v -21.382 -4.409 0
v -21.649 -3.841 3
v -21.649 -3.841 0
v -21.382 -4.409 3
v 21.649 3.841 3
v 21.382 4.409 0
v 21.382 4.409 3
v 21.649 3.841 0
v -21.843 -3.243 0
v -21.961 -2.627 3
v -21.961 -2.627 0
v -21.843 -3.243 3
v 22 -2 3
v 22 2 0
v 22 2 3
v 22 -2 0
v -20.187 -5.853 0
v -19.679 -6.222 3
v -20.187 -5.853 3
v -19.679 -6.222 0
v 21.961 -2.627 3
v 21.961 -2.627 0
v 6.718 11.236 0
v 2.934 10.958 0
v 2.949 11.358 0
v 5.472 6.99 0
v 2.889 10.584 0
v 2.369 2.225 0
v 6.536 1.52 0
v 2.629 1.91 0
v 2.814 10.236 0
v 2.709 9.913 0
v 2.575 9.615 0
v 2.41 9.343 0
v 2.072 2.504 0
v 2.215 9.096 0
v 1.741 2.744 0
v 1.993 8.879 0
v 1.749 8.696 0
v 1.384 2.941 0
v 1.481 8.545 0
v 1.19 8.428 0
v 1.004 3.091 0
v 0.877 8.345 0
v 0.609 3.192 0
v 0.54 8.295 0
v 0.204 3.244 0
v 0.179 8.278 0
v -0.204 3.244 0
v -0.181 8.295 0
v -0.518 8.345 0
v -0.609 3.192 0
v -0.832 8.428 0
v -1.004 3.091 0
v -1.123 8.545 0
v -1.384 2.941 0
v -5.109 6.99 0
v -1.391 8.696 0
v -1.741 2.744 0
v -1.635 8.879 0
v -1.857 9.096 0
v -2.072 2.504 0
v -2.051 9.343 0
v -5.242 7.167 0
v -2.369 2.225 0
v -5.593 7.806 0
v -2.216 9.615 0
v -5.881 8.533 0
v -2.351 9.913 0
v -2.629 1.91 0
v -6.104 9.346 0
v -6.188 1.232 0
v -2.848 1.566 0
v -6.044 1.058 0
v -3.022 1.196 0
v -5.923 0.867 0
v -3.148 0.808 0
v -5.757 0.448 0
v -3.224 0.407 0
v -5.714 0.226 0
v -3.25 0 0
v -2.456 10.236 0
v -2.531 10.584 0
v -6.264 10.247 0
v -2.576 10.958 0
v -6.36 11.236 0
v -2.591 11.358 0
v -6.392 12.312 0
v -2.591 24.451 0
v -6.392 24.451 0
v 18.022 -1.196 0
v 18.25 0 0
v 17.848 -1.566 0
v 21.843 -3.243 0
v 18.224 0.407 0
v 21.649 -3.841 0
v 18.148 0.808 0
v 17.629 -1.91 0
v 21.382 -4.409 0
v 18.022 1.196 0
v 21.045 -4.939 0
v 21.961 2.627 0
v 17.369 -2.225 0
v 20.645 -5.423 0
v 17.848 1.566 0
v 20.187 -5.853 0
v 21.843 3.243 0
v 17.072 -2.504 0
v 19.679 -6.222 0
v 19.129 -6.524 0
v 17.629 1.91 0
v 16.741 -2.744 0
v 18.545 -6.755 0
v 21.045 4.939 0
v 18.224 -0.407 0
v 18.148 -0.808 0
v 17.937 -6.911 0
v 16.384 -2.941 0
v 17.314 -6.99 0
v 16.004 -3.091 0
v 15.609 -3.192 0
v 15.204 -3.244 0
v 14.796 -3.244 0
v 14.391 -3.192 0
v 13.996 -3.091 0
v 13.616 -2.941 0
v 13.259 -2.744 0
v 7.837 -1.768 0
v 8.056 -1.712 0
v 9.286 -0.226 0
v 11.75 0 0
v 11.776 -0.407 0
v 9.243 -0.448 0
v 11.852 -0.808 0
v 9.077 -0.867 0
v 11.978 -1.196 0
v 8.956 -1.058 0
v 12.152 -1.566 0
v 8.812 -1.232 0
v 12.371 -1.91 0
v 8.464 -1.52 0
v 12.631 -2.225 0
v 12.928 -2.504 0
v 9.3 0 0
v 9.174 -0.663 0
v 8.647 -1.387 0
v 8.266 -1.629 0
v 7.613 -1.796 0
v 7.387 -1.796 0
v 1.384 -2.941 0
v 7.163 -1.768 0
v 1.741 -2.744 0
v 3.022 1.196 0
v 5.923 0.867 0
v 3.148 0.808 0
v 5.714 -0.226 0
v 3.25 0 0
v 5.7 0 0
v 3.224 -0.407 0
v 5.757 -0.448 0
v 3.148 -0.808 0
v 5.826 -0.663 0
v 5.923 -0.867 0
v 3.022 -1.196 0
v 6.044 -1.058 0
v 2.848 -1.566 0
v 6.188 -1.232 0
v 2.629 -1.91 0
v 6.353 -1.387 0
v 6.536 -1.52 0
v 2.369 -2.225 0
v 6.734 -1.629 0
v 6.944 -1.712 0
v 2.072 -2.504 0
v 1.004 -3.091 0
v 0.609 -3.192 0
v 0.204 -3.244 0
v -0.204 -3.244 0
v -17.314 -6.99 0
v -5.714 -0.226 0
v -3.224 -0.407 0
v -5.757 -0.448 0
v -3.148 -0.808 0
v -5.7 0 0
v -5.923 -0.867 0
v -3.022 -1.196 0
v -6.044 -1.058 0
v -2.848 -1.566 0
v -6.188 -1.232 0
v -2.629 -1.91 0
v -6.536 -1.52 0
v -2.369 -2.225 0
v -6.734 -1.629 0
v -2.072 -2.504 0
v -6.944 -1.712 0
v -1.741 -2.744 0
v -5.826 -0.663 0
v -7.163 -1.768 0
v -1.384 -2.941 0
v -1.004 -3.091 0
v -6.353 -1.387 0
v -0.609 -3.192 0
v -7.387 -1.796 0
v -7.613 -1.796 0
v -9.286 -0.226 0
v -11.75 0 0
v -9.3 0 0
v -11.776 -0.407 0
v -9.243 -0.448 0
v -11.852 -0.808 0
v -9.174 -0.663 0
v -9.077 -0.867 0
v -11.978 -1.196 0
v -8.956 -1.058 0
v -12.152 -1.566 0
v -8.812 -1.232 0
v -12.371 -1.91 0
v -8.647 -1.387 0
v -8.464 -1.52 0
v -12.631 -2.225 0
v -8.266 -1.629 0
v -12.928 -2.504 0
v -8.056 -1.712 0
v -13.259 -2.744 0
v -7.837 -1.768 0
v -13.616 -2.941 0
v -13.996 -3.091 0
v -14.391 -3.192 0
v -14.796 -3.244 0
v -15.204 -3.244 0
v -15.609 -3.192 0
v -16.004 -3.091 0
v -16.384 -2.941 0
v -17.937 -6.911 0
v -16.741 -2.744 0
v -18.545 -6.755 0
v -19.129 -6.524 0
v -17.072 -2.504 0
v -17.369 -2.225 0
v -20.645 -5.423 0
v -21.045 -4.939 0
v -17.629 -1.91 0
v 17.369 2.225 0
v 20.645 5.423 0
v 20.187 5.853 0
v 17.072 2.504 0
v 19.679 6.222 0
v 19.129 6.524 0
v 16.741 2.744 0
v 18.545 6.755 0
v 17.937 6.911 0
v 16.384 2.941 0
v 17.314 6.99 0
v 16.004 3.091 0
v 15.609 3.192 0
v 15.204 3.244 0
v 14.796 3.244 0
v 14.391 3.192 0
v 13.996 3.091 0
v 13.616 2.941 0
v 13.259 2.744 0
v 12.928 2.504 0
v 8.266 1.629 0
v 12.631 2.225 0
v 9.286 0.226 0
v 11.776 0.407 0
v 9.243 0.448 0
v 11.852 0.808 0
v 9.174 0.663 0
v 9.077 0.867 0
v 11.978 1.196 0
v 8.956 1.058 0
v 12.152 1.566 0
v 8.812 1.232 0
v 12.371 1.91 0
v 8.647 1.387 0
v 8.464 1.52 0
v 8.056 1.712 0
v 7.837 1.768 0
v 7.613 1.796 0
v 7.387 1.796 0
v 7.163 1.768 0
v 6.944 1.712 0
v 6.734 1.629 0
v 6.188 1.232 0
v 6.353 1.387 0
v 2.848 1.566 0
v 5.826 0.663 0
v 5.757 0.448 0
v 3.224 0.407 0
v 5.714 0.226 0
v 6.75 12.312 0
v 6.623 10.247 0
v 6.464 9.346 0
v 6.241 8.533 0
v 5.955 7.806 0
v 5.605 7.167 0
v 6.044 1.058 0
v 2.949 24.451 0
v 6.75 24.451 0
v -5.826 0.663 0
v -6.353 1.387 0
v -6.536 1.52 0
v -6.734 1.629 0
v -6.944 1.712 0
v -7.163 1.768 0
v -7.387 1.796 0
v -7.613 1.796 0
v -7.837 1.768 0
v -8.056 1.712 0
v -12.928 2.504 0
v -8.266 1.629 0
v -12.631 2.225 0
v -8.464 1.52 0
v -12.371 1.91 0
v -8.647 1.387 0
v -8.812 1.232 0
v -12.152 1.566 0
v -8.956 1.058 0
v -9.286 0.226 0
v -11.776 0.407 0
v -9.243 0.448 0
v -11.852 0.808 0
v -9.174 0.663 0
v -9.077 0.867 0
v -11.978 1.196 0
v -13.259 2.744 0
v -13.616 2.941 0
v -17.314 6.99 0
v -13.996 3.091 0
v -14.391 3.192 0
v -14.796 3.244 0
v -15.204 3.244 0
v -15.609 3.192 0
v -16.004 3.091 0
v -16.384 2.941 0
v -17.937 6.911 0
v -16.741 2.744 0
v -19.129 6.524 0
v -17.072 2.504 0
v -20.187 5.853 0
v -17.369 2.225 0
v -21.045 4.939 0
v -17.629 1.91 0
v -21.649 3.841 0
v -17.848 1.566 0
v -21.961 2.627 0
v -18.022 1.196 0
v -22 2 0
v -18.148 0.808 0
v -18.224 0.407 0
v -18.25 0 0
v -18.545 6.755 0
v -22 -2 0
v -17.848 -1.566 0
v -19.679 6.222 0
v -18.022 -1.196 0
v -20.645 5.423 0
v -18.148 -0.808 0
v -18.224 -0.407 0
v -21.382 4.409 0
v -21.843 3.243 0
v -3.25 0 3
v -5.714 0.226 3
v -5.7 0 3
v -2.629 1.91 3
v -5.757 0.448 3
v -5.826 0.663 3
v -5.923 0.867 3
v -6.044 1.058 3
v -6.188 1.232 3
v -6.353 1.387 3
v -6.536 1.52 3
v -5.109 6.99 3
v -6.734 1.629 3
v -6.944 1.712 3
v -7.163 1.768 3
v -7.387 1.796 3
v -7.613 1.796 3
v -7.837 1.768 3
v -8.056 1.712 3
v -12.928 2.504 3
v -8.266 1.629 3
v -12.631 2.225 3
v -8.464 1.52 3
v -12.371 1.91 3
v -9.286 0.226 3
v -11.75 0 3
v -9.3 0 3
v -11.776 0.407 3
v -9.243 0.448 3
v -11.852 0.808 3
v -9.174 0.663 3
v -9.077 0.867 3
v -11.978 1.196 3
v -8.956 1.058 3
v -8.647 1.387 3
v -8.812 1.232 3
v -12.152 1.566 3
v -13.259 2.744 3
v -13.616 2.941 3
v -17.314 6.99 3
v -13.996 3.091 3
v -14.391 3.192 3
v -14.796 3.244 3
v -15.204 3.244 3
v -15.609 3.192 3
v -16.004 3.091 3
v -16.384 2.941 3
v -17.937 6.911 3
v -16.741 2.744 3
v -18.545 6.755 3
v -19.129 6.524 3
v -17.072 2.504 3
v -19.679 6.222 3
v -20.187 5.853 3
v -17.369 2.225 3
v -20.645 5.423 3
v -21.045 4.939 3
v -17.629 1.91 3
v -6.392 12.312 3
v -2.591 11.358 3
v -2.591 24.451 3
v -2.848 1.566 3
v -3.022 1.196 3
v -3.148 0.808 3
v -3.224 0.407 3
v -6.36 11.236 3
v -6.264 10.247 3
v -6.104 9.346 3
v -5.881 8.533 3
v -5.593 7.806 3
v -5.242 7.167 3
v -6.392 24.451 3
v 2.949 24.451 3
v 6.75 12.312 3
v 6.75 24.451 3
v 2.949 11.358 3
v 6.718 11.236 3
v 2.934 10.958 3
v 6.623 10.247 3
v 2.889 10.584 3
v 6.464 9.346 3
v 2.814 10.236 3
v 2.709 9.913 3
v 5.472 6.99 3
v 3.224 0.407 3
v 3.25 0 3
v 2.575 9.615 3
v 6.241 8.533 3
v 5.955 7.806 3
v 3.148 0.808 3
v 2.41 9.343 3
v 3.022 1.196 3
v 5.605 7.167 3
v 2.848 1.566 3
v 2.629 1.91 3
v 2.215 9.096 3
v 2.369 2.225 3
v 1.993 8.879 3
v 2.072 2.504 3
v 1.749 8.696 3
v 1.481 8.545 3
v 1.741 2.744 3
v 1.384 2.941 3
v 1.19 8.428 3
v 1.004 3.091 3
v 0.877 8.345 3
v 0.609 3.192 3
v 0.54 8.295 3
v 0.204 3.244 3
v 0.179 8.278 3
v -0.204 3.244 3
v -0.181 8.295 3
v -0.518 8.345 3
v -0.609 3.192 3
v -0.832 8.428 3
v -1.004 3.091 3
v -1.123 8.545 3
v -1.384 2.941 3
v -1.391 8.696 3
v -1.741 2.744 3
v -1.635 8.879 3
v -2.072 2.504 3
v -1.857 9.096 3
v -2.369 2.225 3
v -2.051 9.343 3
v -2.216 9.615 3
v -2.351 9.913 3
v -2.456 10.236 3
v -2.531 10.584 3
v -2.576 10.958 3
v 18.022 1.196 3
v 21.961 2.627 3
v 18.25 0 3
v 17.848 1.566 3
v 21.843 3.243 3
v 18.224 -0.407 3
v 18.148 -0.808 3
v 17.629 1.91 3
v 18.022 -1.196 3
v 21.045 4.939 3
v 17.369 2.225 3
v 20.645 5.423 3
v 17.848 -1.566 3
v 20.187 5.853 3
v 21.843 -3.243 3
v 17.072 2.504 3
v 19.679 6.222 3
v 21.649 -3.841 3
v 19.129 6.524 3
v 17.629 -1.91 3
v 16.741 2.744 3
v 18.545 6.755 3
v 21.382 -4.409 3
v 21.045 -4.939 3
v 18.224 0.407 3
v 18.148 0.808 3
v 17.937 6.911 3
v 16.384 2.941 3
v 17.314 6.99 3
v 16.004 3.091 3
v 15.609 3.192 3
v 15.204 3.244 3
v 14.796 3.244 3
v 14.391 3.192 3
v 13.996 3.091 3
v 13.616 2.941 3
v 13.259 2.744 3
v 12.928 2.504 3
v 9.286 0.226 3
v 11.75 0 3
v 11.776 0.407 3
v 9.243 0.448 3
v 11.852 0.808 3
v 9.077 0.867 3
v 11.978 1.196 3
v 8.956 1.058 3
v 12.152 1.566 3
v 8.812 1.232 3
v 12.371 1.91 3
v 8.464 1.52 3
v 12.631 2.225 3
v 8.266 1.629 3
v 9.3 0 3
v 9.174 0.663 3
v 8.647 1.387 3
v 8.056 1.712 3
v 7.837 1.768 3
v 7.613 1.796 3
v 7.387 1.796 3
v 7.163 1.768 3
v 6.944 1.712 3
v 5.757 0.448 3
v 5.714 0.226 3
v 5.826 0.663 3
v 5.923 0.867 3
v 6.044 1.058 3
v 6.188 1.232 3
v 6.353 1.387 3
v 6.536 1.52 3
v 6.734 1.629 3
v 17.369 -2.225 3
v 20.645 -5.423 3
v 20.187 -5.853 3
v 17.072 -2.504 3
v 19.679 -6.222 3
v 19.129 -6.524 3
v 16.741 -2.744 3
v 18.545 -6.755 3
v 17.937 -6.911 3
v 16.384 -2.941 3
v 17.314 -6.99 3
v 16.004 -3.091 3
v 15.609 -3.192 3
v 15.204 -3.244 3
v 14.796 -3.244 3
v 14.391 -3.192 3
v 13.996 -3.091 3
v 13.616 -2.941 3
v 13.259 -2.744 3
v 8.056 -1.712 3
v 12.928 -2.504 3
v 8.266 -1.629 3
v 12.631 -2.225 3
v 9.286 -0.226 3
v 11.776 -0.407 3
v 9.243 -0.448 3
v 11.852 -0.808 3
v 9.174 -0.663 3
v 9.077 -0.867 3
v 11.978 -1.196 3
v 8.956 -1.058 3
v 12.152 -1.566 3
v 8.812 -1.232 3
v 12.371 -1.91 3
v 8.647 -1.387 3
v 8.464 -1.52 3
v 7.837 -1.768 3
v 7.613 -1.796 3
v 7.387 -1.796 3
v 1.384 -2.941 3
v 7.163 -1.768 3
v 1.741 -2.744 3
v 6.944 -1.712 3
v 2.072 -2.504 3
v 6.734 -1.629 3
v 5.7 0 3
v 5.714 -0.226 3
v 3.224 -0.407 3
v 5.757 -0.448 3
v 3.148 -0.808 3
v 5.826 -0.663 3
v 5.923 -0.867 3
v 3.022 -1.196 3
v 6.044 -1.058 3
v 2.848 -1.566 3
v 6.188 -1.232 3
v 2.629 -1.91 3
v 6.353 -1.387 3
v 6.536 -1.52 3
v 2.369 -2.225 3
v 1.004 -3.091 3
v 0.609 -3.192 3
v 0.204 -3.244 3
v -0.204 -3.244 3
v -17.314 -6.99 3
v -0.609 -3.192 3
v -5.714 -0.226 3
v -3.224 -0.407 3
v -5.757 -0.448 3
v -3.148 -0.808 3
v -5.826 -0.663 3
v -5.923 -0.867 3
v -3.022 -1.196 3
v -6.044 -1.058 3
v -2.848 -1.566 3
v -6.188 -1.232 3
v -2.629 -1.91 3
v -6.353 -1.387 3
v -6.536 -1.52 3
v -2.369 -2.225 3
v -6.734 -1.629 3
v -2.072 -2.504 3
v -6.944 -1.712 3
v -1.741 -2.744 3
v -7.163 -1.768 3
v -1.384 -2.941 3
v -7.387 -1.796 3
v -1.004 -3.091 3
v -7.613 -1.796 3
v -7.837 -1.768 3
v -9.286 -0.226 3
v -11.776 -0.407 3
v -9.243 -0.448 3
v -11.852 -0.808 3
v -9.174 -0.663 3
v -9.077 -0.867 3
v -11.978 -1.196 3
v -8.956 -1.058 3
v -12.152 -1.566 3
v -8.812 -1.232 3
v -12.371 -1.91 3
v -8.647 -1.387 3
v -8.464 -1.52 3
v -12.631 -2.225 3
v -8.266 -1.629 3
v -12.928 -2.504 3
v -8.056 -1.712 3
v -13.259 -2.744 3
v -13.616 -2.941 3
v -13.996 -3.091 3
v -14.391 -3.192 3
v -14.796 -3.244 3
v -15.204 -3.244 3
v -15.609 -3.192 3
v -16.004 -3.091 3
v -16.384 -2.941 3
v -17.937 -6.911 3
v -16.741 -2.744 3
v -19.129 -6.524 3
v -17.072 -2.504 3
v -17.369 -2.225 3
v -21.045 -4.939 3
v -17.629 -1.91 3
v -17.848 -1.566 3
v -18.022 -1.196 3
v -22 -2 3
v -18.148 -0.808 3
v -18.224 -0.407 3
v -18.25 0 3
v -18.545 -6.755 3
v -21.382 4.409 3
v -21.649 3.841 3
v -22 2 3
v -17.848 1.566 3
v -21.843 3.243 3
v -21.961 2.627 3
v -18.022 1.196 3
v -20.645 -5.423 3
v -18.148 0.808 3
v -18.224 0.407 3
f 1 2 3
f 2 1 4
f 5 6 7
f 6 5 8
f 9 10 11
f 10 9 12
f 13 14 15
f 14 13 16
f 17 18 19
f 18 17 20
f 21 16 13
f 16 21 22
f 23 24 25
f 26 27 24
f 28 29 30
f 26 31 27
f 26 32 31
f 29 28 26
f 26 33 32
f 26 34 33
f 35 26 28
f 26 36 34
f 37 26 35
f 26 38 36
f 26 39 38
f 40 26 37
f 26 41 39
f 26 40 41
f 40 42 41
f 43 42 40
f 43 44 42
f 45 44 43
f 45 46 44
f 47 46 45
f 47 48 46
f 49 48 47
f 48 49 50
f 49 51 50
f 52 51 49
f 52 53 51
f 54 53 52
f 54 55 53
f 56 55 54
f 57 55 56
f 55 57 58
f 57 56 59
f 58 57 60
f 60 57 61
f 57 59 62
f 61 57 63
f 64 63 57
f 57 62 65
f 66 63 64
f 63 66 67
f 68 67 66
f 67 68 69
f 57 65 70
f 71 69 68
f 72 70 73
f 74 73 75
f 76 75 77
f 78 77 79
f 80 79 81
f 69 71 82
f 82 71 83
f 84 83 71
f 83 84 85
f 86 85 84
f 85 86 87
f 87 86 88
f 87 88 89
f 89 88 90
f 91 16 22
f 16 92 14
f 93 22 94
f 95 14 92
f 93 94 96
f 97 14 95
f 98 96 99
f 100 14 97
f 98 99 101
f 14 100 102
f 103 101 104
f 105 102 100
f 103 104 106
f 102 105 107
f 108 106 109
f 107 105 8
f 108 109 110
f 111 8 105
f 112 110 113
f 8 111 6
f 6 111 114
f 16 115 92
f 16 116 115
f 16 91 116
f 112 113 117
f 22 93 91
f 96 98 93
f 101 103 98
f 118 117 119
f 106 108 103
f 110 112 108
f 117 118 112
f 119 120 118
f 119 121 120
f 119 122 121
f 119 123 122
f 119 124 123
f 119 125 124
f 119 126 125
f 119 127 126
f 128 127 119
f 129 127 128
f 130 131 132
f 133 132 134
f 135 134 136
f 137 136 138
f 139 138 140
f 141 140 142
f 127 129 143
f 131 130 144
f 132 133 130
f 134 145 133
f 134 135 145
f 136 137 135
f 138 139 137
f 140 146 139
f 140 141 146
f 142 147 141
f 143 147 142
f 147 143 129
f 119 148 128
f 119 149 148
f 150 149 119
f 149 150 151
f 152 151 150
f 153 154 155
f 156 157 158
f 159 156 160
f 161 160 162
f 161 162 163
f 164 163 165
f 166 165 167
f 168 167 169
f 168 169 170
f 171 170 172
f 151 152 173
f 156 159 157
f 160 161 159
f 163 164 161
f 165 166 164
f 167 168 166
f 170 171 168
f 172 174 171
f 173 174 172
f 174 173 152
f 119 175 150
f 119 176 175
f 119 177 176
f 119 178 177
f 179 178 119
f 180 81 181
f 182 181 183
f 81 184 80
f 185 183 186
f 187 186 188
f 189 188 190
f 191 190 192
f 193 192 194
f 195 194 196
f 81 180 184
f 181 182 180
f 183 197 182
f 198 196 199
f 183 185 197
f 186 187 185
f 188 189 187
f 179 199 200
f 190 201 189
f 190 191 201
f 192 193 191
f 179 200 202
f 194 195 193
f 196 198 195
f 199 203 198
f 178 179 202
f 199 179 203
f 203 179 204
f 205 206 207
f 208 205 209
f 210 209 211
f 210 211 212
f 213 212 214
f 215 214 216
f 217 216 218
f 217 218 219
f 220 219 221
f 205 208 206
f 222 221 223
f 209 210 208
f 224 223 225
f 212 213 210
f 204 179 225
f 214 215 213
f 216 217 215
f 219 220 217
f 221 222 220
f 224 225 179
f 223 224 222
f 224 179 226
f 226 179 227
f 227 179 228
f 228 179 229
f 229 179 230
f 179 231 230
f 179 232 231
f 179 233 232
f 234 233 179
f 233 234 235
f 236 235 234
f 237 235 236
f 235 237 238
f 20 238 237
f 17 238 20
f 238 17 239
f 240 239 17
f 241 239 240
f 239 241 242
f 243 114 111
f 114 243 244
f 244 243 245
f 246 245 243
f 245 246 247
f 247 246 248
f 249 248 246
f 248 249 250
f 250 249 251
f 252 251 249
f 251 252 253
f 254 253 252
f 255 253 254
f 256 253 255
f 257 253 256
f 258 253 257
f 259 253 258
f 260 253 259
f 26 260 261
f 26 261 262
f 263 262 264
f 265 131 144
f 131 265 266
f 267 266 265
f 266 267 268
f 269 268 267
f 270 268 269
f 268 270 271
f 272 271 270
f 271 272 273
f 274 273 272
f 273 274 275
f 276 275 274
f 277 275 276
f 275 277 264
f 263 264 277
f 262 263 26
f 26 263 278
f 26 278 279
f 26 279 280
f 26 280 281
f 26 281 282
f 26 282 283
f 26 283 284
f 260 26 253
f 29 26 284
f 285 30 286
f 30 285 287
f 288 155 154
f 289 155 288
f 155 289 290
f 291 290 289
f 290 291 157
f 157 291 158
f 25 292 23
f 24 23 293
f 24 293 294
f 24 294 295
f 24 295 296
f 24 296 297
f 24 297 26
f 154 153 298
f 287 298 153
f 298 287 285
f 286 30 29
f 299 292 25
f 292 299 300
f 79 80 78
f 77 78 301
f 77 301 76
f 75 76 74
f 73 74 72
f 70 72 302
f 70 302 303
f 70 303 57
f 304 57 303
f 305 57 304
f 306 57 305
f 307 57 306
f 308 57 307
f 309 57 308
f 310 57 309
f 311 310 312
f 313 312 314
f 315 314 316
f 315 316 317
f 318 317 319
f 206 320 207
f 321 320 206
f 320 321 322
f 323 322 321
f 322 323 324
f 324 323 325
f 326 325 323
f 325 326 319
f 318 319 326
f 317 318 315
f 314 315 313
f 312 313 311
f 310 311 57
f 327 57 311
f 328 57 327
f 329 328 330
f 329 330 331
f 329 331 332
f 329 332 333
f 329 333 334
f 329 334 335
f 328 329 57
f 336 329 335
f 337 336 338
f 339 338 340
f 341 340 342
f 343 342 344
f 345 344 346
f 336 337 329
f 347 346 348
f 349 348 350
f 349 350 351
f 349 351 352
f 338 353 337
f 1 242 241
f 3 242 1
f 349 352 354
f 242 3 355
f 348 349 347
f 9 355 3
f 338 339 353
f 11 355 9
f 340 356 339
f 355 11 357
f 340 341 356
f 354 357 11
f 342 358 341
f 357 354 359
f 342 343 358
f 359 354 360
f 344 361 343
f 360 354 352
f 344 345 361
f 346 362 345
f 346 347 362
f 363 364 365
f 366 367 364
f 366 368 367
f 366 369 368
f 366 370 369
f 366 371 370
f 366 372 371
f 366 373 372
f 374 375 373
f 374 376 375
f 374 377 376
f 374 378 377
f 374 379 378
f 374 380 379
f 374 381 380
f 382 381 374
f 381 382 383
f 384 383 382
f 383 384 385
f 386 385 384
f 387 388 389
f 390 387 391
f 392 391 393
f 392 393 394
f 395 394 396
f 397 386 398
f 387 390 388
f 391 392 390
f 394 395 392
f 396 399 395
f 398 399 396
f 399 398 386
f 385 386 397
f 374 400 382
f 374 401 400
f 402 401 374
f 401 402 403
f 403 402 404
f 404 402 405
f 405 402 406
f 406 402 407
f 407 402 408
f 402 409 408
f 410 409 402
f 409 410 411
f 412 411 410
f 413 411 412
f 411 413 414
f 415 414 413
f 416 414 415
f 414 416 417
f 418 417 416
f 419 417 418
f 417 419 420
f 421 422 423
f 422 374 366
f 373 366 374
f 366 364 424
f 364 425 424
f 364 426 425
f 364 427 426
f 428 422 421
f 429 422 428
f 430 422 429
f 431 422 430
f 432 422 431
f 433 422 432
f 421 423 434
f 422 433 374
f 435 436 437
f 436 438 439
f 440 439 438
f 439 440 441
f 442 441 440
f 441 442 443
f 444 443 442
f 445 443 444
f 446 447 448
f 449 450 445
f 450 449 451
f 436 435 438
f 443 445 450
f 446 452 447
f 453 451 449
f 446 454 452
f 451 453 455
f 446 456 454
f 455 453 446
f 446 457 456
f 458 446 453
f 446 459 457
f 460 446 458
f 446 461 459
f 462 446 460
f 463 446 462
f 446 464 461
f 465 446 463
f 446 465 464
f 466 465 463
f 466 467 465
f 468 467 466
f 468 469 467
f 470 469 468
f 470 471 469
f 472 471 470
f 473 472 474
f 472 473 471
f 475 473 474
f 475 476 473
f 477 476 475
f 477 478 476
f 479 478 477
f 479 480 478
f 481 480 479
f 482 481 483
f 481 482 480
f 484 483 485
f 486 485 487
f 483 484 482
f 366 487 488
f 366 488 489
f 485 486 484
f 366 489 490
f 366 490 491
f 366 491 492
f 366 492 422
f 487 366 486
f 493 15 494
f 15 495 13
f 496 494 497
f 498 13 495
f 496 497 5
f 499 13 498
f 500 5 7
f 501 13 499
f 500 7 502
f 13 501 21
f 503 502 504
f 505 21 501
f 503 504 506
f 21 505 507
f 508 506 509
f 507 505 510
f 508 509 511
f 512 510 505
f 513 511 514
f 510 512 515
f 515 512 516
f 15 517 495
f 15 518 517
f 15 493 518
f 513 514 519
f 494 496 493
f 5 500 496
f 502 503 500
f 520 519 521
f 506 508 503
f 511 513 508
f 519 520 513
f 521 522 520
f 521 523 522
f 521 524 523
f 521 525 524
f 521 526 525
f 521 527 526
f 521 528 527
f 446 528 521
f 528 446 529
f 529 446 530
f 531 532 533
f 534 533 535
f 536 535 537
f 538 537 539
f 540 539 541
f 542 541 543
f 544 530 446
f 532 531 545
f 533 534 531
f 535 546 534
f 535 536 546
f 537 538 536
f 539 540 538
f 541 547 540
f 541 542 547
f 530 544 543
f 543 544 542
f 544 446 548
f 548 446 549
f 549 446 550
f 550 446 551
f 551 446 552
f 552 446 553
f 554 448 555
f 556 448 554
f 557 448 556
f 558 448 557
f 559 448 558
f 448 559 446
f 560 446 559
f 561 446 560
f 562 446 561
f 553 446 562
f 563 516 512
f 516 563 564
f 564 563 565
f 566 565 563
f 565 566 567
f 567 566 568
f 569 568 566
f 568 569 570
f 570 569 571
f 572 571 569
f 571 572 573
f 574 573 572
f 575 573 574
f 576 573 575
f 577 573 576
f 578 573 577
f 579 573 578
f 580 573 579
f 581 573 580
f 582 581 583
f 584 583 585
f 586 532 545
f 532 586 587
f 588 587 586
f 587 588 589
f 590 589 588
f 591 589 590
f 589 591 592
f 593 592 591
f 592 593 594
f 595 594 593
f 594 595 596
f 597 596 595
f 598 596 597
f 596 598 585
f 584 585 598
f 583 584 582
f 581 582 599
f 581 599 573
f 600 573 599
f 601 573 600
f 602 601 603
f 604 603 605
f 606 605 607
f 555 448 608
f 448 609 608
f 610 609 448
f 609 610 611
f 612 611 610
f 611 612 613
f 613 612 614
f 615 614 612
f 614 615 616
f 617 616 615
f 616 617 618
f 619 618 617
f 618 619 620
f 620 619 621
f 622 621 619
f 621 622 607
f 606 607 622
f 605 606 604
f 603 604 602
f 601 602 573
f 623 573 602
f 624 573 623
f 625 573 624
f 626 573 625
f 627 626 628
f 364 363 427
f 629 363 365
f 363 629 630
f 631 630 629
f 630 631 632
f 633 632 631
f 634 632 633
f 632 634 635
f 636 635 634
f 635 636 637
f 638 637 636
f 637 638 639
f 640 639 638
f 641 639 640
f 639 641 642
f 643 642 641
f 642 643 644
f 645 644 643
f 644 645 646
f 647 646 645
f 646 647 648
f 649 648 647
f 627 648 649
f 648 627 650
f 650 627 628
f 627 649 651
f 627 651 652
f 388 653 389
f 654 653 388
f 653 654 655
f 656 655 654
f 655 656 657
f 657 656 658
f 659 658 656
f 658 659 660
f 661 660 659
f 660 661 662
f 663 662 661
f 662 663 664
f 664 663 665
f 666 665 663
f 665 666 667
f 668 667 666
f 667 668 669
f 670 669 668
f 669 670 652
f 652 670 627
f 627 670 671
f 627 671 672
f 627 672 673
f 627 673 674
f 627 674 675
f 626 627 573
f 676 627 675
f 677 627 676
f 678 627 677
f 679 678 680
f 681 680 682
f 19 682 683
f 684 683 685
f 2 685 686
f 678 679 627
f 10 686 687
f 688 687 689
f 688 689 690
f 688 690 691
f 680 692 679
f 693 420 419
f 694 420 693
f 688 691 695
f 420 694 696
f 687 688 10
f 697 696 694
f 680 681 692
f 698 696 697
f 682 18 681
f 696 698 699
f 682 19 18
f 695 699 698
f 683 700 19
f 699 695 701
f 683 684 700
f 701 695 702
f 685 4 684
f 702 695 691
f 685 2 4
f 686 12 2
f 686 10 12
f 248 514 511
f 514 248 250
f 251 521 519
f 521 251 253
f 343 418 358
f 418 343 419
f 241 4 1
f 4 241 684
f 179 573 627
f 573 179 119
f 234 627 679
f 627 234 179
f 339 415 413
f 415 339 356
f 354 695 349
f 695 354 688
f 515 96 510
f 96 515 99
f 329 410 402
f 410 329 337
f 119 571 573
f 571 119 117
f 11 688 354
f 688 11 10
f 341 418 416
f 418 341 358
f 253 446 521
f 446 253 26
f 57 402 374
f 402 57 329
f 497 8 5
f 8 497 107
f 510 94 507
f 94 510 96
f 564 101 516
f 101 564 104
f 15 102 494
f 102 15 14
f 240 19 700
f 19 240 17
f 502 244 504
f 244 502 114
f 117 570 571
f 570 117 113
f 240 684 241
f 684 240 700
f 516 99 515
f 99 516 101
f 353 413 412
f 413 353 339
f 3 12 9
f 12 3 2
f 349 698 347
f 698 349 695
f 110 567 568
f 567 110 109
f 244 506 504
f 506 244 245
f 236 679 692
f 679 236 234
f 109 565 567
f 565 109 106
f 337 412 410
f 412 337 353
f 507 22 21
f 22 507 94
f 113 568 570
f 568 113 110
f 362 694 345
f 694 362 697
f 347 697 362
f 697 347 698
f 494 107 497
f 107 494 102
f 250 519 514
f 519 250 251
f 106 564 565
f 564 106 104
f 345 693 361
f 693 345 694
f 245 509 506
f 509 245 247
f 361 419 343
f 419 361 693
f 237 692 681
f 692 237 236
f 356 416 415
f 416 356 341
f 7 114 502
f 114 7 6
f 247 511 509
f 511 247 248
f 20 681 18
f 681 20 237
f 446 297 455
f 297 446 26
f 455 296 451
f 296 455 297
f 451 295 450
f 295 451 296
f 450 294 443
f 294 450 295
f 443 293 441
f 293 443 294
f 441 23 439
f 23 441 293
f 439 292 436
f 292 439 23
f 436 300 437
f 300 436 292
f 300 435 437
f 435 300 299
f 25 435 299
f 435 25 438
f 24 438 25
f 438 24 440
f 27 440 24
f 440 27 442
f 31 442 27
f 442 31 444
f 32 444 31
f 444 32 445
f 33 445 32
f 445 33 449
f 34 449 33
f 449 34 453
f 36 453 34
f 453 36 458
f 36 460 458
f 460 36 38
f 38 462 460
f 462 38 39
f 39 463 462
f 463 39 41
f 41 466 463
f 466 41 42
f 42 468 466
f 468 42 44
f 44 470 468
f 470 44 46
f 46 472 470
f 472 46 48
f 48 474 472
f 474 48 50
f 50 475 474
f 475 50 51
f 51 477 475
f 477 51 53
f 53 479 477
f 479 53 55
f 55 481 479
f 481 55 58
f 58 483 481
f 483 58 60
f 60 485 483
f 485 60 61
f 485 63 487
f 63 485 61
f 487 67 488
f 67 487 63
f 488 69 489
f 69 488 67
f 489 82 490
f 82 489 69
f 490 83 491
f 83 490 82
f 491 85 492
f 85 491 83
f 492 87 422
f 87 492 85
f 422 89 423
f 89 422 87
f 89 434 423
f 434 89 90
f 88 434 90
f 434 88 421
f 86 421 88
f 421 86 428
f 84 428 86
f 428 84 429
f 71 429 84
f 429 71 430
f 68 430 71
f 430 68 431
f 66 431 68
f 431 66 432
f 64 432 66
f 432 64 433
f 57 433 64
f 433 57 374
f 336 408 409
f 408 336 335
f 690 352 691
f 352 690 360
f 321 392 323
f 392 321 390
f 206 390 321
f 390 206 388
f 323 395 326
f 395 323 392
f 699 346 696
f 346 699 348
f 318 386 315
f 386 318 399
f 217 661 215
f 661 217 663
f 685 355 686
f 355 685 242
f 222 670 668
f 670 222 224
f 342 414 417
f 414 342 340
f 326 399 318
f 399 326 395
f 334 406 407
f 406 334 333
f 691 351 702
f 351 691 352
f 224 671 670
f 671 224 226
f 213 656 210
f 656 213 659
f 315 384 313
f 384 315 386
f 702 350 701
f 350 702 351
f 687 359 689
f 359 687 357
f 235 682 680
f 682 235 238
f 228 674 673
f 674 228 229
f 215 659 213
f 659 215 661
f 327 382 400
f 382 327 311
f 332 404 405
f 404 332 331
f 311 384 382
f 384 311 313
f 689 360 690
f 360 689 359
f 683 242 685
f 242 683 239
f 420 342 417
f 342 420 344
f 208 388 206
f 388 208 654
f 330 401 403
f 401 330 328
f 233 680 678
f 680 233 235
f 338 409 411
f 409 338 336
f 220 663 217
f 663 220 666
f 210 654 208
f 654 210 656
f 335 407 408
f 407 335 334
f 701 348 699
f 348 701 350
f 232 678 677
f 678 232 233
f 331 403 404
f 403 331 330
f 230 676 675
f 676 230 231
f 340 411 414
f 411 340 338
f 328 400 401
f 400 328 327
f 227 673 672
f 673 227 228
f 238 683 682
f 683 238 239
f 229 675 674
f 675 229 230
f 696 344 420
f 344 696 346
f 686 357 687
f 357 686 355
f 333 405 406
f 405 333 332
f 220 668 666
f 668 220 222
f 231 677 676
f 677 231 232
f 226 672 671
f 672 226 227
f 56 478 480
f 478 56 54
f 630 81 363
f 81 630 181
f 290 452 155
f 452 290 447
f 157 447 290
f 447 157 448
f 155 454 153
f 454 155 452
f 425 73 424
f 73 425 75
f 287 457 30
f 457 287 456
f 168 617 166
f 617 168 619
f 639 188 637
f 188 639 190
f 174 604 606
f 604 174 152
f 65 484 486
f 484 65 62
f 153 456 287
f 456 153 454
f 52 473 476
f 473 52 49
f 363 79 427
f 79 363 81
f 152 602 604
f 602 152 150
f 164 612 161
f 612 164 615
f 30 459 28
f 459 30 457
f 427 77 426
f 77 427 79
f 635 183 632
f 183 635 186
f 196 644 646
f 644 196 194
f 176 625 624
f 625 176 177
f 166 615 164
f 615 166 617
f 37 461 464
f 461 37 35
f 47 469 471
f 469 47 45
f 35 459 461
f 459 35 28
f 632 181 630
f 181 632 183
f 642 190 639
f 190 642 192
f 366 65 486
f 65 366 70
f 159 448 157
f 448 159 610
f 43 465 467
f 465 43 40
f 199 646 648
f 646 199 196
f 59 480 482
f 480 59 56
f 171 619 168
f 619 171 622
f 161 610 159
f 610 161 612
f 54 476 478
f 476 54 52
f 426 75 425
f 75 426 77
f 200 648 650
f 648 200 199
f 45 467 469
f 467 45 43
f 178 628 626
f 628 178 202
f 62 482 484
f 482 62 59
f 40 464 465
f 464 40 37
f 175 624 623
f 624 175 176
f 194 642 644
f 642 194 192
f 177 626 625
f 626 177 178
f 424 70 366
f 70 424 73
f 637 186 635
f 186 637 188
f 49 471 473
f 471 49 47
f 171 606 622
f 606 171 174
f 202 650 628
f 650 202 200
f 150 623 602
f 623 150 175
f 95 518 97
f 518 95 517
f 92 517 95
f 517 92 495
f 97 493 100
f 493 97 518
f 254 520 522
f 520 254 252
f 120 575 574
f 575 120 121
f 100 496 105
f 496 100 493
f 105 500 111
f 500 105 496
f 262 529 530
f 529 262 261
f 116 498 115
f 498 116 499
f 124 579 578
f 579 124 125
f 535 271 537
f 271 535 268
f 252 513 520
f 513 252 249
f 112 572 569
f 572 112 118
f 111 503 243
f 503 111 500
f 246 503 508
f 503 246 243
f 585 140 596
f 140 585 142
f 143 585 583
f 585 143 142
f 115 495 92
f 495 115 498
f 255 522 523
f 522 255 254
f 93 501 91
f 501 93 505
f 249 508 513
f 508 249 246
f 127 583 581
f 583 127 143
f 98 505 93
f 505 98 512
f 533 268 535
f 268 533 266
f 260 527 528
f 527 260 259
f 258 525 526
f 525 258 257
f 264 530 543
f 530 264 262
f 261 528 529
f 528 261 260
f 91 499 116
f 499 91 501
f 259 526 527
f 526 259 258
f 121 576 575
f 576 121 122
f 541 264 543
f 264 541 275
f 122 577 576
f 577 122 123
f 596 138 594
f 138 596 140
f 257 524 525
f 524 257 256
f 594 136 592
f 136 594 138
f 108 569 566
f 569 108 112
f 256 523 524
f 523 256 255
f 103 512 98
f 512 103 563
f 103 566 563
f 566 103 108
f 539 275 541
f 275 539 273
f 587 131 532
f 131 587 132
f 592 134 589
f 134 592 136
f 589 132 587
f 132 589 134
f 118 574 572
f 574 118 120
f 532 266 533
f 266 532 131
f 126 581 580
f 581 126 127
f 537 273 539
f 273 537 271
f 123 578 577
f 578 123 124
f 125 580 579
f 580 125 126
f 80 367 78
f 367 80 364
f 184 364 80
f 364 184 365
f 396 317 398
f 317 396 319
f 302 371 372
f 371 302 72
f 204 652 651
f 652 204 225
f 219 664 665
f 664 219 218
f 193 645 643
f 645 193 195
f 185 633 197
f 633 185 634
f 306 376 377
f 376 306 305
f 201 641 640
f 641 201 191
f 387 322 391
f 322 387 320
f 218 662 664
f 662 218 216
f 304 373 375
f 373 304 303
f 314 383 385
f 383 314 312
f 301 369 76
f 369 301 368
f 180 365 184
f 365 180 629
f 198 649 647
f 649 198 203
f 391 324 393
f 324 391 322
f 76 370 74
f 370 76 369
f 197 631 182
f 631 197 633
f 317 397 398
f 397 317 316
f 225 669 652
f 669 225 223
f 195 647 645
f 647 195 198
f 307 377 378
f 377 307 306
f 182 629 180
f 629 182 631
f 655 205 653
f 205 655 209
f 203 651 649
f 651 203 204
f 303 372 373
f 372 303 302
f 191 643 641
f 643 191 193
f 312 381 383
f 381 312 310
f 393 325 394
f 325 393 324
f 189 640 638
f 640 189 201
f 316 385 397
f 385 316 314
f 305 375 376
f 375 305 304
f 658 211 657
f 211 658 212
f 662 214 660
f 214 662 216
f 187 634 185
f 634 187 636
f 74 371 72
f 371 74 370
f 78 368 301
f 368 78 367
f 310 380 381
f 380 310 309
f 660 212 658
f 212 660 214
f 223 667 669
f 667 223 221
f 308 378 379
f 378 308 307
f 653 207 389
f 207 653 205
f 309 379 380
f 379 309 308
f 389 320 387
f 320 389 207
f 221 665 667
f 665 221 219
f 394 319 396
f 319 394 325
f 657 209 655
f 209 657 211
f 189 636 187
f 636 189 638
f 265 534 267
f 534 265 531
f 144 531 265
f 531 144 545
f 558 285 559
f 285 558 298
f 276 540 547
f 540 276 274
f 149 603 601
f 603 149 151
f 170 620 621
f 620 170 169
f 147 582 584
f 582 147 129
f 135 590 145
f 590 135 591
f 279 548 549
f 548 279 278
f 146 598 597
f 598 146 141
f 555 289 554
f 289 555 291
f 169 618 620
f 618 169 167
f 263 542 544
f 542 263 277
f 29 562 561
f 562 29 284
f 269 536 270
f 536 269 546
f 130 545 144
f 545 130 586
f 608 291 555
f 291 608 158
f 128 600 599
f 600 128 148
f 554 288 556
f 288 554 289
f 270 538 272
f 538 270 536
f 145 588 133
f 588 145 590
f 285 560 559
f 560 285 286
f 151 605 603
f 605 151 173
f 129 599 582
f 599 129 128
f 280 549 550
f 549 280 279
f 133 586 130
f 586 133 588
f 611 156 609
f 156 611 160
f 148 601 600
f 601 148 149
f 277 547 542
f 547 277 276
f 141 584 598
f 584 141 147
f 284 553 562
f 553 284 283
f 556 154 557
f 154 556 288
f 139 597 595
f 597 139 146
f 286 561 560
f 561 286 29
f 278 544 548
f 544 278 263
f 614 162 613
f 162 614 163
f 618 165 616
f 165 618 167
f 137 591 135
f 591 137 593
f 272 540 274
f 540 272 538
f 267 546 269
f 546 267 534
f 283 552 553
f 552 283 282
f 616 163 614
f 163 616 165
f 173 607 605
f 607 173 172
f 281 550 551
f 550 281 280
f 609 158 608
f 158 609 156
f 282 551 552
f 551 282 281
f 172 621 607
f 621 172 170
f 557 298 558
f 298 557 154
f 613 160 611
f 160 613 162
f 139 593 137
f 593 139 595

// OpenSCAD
$fn = 50;


difference() {
	union() {
		hull() {
			translate(v = [-17.0000000000, 2.0000000000, 0]) {
				cylinder(h = 3, r = 5);
			}
			translate(v = [17.0000000000, 2.0000000000, 0]) {
				cylinder(h = 3, r = 5);
			}
			translate(v = [-17.0000000000, -2.0000000000, 0]) {
				cylinder(h = 3, r = 5);
			}
			translate(v = [17.0000000000, -2.0000000000, 0]) {
				cylinder(h = 3, r = 5);
			}
		}
		translate(v = [0, 24, 0]) {
			linear_extrude(height = 3) {
				text(font = "DejaVu Sans Mono:style=Bold", halign = "center", size = 19.0000000000, text = "U", valign = "top");
			}
		}
	}
	union() {
		translate(v = [-15.0000000000, 0.0000000000, 0]) {
			translate(v = [0, 0, -100]) {
				cylinder(h = 200, r = 3.2500000000);
			}
		}
		translate(v = [0, 0, -100]) {
			cylinder(h = 200, r = 3.2500000000);
		}
		translate(v = [15.0000000000, 0.0000000000, 0]) {
			translate(v = [0, 0, -100]) {
				cylinder(h = 200, r = 3.2500000000);
			}
		}
		translate(v = [-15.0000000000, 0.0000000000, 0]) {
			translate(v = [0, 0, -100]) {
				cylinder(h = 200, r = 1.8000000000);
			}
		}
		translate(v = [-7.5000000000, 0.0000000000, 0]) {
			translate(v = [0, 0, -100]) {
				cylinder(h = 200, r = 1.8000000000);
			}
		}
		translate(v = [0, 0, -100]) {
			cylinder(h = 200, r = 1.8000000000);
		}
		translate(v = [7.5000000000, 0.0000000000, 0]) {
			translate(v = [0, 0, -100]) {
				cylinder(h = 200, r = 1.8000000000);
			}
		}
		translate(v = [15.0000000000, 0.0000000000, 0]) {
			translate(v = [0, 0, -100]) {
				cylinder(h = 200, r = 1.8000000000);
			}
		}
	}
}
